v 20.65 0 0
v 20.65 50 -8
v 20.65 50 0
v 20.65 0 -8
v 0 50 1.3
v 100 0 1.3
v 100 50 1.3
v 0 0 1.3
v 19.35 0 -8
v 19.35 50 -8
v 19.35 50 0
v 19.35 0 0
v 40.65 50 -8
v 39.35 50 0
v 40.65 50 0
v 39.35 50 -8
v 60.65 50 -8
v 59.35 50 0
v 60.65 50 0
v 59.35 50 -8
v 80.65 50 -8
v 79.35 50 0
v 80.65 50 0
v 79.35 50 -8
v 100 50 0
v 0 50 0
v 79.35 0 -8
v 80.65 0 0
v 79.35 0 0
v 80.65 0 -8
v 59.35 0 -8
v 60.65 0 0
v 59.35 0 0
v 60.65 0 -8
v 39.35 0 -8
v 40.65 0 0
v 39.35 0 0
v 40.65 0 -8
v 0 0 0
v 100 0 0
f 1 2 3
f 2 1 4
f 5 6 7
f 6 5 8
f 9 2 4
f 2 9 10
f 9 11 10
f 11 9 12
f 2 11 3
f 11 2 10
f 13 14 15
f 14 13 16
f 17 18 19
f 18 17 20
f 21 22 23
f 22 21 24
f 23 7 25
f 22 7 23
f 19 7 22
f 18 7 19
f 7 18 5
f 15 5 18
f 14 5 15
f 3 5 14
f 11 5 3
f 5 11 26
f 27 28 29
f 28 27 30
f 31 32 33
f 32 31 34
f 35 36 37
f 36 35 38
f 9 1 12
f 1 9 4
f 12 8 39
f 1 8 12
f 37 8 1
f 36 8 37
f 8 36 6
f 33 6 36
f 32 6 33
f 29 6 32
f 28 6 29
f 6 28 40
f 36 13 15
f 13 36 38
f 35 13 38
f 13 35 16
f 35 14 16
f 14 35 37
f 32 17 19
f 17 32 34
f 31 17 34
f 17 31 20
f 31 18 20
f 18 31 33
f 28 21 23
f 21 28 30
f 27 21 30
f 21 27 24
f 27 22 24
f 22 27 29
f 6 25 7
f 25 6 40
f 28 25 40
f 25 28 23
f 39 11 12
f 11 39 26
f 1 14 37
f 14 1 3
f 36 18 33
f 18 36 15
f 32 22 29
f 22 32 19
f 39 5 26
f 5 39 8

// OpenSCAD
$fn = 32;

// ----------------------------------------------------------------------
// Ribbed panel: 1.3 mm panel
// ----------------------------------------------------------------------

// --- parameters (mm) ---
panel_l = 100;            // panel length, X
panel_w = 50;             // panel width, Y
panel_t = 1.3;            // panel thickness, Z
rib_t = 1.3;              // rib thickness
rib_h = 8;                // rib height below the panel
ribs = 4;                 // number of ribs

total_h = panel_t + rib_h;  // overall height

union() {
  cube([panel_l, panel_w, panel_t]);
  for (i = [1 : ribs])
    translate([i * panel_l / (ribs + 1) - rib_t / 2, 0, -rib_h])
      cube([rib_t, panel_w, rib_h + panel_t]);
}
